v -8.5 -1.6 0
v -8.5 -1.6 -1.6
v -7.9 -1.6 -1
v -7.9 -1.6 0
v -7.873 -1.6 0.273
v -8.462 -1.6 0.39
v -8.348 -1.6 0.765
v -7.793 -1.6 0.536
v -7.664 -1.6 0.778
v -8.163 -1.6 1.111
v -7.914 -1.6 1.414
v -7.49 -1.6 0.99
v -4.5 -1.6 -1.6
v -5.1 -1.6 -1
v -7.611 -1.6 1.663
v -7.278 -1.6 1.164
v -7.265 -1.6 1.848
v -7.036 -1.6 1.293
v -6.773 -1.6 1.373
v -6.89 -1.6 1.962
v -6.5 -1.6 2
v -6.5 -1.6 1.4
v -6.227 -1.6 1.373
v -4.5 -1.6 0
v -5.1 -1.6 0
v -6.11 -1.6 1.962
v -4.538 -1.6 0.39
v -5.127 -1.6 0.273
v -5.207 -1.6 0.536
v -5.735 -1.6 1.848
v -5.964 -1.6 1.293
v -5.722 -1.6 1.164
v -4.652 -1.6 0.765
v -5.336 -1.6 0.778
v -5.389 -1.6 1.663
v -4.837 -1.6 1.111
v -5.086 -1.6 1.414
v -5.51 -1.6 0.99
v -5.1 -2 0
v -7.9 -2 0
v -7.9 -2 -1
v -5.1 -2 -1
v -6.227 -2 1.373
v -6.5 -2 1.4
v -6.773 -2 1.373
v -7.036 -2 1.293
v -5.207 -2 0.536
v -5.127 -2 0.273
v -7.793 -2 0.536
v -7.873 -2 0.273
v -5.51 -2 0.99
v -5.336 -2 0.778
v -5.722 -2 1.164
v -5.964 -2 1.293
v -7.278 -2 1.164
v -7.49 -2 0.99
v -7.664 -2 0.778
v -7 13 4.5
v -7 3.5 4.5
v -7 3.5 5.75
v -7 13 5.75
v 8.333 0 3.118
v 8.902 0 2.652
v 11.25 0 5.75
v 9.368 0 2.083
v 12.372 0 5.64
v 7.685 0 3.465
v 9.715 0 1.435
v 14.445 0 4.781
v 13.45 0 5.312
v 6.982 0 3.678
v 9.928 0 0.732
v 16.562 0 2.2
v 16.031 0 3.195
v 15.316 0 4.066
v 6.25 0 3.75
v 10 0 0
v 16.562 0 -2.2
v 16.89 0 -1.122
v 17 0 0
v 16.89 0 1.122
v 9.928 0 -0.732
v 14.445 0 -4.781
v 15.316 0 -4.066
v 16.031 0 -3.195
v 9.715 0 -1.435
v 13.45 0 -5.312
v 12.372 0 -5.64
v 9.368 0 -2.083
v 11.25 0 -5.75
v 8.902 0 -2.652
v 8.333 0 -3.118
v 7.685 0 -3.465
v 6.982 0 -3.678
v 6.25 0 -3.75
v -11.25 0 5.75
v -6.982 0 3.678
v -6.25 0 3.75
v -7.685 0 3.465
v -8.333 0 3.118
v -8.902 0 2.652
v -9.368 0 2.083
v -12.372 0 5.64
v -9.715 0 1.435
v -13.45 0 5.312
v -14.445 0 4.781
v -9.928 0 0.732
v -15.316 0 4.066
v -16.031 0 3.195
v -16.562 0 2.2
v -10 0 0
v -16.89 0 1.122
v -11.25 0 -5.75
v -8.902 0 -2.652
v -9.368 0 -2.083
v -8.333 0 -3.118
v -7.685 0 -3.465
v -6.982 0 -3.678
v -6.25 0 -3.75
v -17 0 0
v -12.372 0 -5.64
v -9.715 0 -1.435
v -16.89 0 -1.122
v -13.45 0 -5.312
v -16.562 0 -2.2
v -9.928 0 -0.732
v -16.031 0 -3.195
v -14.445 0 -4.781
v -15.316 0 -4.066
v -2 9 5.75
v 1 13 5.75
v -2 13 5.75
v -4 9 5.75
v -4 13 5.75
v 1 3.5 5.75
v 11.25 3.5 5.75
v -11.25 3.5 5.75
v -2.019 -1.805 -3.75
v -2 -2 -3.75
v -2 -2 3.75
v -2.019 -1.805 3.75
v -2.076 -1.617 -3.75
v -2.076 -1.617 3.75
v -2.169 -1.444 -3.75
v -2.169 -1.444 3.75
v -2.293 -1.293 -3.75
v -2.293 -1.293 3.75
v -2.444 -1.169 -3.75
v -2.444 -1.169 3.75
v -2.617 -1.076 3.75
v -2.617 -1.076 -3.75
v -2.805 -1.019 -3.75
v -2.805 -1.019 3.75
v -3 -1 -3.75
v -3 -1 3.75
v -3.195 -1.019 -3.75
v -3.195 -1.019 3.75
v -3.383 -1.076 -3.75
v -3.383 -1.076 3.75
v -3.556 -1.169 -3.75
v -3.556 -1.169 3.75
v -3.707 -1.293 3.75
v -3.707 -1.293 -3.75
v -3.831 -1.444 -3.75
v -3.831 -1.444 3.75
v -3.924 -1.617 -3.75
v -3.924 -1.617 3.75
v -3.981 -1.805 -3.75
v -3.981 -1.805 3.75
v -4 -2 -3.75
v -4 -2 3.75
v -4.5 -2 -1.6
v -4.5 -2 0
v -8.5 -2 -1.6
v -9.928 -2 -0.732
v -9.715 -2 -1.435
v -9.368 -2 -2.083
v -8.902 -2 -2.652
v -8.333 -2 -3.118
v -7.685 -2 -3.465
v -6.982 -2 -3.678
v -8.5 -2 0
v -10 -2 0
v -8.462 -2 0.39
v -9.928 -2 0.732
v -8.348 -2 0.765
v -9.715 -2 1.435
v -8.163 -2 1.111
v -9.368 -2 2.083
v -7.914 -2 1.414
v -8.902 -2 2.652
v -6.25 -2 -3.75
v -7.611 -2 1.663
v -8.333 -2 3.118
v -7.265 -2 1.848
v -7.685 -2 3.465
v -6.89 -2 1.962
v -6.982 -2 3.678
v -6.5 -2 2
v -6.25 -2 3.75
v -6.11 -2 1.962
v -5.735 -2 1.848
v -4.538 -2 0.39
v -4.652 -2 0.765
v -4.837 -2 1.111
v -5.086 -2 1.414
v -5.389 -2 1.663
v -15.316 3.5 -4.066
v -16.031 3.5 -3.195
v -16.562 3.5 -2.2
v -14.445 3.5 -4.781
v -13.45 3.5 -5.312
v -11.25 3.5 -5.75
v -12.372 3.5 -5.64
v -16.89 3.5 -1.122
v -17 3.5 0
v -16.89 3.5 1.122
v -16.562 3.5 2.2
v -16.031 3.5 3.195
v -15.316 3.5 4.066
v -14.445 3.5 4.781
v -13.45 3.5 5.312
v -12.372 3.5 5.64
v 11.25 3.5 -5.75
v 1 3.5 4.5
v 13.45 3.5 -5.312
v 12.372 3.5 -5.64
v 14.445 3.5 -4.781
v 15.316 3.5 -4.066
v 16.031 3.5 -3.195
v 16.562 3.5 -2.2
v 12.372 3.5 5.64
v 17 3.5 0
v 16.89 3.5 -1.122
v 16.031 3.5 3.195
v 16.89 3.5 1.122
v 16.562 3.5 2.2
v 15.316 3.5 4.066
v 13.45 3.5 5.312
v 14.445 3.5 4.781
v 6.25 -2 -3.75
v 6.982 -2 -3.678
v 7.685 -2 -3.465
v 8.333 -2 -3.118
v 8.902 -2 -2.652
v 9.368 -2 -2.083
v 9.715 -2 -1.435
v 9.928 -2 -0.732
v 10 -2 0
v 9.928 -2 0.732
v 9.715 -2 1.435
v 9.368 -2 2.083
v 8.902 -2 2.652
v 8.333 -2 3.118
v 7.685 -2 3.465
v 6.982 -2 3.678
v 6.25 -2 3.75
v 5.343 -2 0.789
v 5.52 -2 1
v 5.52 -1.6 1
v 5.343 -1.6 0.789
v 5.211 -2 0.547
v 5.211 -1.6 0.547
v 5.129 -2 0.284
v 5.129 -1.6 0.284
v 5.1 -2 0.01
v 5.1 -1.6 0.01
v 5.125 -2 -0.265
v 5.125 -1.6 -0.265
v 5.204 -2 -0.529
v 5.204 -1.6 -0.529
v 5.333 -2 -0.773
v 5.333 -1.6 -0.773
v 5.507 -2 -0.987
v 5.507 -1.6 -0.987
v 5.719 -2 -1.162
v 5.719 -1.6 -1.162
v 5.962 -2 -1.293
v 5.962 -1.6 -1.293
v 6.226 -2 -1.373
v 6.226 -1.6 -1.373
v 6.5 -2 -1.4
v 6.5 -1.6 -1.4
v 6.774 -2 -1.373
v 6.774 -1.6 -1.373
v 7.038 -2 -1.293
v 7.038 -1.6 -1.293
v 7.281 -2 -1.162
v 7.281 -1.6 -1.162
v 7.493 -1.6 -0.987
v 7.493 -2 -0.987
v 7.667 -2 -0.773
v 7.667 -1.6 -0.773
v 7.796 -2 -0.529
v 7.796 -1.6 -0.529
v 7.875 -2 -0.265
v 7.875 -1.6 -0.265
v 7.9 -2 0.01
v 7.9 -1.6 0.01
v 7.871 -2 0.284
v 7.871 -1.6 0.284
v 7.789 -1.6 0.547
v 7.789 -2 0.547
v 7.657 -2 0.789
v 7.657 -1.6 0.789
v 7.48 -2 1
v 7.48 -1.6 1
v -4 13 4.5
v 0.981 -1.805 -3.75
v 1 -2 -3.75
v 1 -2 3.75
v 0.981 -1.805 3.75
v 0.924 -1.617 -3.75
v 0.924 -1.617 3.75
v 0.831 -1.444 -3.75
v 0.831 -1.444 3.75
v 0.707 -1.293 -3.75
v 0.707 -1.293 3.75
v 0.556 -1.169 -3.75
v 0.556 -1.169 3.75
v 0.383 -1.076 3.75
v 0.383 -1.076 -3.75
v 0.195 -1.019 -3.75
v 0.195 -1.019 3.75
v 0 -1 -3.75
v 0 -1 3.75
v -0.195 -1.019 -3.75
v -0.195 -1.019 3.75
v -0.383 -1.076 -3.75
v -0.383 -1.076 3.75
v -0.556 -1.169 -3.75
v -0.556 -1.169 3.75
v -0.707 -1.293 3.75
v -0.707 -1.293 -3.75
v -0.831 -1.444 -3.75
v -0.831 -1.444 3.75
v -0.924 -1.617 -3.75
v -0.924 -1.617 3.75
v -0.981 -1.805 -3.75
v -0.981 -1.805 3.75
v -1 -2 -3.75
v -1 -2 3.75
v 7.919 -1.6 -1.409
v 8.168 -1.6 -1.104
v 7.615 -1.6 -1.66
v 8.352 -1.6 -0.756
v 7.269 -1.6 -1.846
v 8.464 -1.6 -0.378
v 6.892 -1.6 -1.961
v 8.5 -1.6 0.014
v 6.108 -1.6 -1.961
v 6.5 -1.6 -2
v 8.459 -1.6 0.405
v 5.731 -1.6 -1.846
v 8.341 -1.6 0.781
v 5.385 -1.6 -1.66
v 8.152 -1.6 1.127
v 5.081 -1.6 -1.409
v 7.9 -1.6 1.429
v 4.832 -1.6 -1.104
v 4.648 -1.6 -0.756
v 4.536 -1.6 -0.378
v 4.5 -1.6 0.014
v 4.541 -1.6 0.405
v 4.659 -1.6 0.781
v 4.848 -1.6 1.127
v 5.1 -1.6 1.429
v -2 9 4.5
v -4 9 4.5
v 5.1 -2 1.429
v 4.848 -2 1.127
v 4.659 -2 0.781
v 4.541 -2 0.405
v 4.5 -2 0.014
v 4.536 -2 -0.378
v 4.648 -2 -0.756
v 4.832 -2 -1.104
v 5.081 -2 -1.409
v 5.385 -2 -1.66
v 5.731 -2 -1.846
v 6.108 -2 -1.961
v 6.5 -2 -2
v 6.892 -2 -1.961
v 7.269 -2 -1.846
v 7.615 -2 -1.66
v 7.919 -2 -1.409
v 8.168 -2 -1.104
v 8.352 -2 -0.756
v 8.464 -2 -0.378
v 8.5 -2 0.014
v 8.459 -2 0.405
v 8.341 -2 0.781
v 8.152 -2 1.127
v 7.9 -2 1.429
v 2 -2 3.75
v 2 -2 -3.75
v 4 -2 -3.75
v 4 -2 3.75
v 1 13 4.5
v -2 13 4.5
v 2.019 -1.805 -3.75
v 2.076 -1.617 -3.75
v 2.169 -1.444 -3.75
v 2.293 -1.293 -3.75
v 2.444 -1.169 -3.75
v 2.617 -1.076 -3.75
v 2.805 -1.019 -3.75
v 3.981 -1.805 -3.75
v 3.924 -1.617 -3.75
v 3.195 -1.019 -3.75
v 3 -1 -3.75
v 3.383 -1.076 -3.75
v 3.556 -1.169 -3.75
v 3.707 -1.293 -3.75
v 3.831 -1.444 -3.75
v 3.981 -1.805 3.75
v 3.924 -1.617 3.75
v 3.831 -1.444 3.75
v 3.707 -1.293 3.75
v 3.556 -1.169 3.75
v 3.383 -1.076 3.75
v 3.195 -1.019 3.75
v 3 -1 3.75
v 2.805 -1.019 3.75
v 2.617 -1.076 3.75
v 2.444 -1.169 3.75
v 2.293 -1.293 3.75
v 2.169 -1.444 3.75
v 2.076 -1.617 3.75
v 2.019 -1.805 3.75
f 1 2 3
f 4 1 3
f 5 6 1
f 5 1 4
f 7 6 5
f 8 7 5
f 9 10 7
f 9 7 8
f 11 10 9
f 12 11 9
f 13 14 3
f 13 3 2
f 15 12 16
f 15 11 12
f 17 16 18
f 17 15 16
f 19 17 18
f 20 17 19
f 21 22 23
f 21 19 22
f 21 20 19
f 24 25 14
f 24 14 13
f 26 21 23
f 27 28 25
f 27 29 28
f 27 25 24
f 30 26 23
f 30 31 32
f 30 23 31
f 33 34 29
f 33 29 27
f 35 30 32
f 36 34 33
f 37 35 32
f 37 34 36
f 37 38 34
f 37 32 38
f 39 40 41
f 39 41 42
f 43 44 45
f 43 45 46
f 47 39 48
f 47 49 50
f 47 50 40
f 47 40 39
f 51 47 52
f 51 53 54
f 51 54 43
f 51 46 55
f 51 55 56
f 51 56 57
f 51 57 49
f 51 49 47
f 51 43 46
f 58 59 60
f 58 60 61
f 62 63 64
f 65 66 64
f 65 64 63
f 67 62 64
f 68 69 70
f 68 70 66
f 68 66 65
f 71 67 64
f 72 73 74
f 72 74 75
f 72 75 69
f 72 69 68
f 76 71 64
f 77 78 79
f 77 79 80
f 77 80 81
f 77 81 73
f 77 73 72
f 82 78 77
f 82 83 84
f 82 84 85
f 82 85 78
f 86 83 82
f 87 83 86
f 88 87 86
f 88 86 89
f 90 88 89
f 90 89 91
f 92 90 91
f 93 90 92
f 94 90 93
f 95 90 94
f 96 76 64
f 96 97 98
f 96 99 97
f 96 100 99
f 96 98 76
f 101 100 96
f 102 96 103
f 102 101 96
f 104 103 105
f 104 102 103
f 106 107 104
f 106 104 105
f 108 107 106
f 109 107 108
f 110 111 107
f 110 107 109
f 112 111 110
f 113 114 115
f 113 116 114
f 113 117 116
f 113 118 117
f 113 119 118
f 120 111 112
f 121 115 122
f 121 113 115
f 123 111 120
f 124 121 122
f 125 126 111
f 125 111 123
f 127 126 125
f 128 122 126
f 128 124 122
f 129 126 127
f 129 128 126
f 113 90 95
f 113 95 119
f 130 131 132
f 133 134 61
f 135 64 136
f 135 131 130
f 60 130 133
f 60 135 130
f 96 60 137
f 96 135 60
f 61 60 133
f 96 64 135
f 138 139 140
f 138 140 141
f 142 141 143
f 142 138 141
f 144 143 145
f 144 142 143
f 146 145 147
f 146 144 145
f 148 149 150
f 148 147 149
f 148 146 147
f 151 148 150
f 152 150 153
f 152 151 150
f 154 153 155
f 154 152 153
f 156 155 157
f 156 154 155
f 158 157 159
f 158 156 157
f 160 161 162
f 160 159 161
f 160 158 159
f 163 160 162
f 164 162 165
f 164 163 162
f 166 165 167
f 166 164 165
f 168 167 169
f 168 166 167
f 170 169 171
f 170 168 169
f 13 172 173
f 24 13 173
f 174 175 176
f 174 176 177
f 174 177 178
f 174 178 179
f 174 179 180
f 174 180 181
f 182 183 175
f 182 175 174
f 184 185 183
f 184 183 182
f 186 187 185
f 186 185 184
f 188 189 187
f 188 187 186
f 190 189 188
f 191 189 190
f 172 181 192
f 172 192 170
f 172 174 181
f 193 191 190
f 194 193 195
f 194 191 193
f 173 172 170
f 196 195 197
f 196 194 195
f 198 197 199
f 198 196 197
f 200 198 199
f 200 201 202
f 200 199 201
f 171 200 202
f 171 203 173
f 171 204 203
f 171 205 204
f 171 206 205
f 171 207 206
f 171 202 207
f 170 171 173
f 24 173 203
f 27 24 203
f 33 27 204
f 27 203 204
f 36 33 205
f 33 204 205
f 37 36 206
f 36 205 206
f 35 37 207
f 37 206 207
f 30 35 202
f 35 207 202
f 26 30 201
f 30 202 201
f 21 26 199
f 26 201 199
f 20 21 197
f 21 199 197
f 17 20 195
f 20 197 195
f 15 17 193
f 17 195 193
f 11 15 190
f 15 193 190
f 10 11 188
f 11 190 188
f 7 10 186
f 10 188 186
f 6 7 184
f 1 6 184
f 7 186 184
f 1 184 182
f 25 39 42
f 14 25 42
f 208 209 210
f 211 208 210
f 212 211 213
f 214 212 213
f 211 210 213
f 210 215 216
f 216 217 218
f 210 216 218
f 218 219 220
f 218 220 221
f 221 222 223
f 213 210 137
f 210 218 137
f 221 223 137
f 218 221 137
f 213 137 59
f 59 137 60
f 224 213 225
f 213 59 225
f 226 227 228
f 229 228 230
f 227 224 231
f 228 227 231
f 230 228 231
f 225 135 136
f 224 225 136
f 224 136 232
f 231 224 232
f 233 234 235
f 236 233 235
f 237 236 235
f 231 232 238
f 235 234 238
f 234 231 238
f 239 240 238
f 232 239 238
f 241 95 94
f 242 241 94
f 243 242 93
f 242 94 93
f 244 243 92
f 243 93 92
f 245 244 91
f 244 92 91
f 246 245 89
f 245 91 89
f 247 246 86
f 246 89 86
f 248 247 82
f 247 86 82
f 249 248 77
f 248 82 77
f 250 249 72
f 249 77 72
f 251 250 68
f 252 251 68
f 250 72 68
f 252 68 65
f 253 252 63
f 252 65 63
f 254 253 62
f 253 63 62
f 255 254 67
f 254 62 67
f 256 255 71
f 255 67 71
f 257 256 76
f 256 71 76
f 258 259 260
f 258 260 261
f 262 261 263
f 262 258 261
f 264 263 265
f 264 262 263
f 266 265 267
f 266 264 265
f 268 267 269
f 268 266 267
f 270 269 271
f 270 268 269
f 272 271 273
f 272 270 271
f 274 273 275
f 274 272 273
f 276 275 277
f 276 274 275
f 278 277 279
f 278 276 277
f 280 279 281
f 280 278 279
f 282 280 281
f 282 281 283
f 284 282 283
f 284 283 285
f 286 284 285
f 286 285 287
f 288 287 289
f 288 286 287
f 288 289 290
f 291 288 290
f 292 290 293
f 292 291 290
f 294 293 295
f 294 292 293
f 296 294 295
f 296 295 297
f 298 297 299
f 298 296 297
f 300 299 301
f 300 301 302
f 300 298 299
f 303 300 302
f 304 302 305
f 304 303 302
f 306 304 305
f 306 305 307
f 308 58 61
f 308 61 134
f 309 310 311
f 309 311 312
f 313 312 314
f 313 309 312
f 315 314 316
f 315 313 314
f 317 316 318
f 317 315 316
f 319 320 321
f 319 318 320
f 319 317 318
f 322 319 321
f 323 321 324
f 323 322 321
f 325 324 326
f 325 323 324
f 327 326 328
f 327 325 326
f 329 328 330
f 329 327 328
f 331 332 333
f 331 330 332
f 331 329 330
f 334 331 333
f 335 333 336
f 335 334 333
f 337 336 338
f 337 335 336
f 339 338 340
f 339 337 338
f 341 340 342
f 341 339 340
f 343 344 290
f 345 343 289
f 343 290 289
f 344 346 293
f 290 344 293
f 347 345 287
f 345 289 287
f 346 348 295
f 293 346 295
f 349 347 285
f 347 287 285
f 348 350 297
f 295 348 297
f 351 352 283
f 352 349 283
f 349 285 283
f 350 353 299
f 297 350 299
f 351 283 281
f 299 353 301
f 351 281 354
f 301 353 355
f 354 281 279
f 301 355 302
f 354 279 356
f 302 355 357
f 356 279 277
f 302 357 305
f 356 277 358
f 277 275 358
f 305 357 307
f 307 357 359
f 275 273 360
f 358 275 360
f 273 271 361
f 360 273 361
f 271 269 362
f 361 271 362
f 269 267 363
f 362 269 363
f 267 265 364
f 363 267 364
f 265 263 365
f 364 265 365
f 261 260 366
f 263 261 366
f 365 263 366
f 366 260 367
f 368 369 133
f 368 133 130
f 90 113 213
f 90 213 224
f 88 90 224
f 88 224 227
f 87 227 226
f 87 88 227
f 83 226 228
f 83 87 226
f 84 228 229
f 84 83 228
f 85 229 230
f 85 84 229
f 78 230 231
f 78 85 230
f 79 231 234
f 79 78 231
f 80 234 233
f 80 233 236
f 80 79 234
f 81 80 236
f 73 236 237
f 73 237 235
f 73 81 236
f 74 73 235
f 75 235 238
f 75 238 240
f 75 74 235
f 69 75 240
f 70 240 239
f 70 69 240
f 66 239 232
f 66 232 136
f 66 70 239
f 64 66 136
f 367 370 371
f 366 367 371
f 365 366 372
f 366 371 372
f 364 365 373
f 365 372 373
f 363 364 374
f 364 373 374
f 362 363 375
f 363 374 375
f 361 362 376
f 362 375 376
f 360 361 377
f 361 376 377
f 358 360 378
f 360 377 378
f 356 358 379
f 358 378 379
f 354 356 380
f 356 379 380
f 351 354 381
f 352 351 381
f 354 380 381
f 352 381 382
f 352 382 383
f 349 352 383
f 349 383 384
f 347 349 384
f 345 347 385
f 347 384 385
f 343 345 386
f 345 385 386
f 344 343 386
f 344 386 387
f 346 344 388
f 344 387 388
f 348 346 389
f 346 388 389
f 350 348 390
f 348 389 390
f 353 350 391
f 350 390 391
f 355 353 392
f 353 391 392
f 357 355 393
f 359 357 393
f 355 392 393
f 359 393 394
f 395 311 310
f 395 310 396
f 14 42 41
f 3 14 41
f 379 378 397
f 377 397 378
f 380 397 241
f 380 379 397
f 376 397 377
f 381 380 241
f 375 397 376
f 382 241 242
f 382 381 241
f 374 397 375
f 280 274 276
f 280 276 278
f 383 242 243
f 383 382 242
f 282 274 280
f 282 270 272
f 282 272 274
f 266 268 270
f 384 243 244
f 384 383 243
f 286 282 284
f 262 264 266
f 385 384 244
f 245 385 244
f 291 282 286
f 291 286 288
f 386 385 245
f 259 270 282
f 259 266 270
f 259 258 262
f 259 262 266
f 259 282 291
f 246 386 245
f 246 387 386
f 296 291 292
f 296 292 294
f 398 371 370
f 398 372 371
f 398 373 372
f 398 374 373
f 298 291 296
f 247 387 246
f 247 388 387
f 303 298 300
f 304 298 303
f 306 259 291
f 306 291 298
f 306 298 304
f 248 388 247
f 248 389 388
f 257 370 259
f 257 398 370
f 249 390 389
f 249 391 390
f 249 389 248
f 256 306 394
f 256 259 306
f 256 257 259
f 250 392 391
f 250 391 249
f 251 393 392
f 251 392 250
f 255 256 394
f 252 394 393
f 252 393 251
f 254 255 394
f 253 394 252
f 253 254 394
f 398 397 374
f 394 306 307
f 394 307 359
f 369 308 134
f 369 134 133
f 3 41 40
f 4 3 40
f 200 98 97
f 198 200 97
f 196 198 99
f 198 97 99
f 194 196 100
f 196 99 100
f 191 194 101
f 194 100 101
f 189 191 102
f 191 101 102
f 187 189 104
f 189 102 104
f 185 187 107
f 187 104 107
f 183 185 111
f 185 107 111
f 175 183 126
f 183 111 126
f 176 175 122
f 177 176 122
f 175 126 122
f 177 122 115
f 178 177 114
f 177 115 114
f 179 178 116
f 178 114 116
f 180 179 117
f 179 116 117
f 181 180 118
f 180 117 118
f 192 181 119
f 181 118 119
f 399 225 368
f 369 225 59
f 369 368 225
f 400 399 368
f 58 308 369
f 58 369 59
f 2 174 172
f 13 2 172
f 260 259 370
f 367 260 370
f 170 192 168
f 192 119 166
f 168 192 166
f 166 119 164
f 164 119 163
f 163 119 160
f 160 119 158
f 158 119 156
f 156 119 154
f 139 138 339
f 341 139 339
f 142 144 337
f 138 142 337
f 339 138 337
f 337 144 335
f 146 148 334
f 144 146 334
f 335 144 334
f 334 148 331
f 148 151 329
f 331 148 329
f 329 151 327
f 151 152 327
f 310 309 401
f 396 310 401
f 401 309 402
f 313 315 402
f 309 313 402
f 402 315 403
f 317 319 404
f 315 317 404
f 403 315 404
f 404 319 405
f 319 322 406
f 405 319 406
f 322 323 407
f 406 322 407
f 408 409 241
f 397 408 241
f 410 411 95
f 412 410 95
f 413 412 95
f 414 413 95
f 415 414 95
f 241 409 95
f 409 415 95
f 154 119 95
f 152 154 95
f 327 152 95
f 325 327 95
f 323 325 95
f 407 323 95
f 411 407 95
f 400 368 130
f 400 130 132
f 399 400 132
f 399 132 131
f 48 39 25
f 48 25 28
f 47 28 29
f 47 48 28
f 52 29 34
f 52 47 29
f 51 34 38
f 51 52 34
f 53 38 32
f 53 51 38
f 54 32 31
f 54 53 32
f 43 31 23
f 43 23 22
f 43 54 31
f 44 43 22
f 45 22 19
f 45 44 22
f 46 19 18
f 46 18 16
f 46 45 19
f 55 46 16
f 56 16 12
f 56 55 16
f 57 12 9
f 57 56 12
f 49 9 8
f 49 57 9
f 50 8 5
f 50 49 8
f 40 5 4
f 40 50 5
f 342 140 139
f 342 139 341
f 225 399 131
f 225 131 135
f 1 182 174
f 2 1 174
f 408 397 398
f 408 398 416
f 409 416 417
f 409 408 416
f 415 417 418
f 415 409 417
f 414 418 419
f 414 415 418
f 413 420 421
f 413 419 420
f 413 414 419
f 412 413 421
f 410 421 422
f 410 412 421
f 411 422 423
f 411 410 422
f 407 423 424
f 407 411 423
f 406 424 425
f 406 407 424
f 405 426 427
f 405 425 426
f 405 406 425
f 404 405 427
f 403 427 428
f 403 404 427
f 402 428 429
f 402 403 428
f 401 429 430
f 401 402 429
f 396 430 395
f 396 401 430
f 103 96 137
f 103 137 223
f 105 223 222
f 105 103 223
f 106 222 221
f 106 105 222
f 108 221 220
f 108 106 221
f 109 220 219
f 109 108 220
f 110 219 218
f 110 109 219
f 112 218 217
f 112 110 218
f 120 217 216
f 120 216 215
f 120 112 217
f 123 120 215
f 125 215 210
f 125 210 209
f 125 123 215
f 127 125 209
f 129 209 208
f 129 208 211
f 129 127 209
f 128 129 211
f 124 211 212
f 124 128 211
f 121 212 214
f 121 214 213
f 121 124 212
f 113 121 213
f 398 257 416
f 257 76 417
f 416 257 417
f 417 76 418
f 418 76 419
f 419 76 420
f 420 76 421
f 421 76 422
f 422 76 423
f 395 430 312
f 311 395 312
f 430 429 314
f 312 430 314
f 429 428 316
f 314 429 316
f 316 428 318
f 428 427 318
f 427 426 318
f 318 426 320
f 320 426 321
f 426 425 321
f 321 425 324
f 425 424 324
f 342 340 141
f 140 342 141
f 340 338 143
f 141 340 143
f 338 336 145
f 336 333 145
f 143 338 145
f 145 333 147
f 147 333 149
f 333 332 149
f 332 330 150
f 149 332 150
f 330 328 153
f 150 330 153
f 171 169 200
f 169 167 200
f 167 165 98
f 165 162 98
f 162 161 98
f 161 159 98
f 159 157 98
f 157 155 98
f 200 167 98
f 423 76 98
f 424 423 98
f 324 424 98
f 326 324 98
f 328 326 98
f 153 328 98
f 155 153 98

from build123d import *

# Parameters (mm, degrees)
PAD001_DEPTH        = 2
PAD002_DEPTH        = 3.5
PAD003_DEPTH        = 1.25
CYLINDER_R          = 1
CYLINDER_DEPTH      = 20
LINEARPATTERN_COUNT = 3
LINEARPATTERN_PITCH = 3
POCKET008_DEPTH     = 0.4


with BuildPart() as part:
    # Sketch008 → Pad001 (new body)
    with BuildSketch(Plane.XZ):
        with BuildLine():
            ThreePointArc((-6.25, 3.75), (-10, 0), (-6.25, -3.75))
            Line((-6.25, -3.75), (6.25, -3.75))
            ThreePointArc((6.25, -3.75), (10, 0), (6.25, 3.75))
            Line((6.25, 3.75), (-6.25, 3.75))
        make_face()
    extrude(amount=PAD001_DEPTH)

    # Sketch010 → Pad002 (join)
    with BuildSketch(Plane.XZ):
        with BuildLine():
            ThreePointArc((-11.25, 5.75), (-17, 0), (-11.25, -5.75))
            Line((-11.25, -5.75), (11.25, -5.75))
            ThreePointArc((11.25, -5.75), (17, 0), (11.25, 5.75))
            Line((11.25, 5.75), (-11.25, 5.75))
        make_face()
    extrude(amount=-PAD002_DEPTH)

    # Sketch011 → Pad003 (join)
    with BuildSketch(Plane.XY.offset(4.5)):
        Polygon((-7, 0), (-7, 13), (-4, 13), (-4, 9), (-2, 9), (-2, 13), (1, 13), (1, 0), align=None)
    extrude(amount=PAD003_DEPTH)

    # Cylinder → Cylinder (cut)
    with BuildSketch(Plane(origin=(-3, -2, -10), x_dir=(1, 0, 0), z_dir=(0, 0, 1))):
        Circle(CYLINDER_R)
    cylinder = extrude(amount=CYLINDER_DEPTH, mode=Mode.SUBTRACT)

    # LinearPattern: Cylinder ×3
    with Locations(*[(i * LINEARPATTERN_PITCH, 0, 0) for i in range(1, LINEARPATTERN_COUNT)]):
        add(cylinder, mode=Mode.SUBTRACT)

    # Sketch012 → Pocket008 (cut)
    with BuildSketch(Plane.XZ.offset(2)):
        with BuildLine():
            ThreePointArc((-4.5, 0), (-6.5, 2), (-8.5, 0))
            Line((-8.5, 0), (-8.5, -1.6))
            Line((-8.5, -1.6), (-4.5, -1.6))
            Line((-4.5, -1.6), (-4.5, 0))
        make_face()
        with BuildLine():
            ThreePointArc((-5.1, 0), (-6.5, 1.4), (-7.9, 0))
            Line((-7.9, -1), (-7.9, 0))
            Line((-5.1, -1), (-7.9, -1))
            Line((-5.1, 0), (-5.1, -1))
        make_face(mode=Mode.SUBTRACT)
        with BuildLine():
            ThreePointArc((5.520204, 1), (6.5, -1.4), (7.479796, 1))
            Line((7.479796, 1), (7.899708, 1.428571))
            ThreePointArc((5.100292, 1.428571), (6.5, -2), (7.899708, 1.428571))
            Line((5.520204, 1), (5.100292, 1.428571))
        make_face()
    extrude(amount=-POCKET008_DEPTH, mode=Mode.SUBTRACT)


solid = part.part
